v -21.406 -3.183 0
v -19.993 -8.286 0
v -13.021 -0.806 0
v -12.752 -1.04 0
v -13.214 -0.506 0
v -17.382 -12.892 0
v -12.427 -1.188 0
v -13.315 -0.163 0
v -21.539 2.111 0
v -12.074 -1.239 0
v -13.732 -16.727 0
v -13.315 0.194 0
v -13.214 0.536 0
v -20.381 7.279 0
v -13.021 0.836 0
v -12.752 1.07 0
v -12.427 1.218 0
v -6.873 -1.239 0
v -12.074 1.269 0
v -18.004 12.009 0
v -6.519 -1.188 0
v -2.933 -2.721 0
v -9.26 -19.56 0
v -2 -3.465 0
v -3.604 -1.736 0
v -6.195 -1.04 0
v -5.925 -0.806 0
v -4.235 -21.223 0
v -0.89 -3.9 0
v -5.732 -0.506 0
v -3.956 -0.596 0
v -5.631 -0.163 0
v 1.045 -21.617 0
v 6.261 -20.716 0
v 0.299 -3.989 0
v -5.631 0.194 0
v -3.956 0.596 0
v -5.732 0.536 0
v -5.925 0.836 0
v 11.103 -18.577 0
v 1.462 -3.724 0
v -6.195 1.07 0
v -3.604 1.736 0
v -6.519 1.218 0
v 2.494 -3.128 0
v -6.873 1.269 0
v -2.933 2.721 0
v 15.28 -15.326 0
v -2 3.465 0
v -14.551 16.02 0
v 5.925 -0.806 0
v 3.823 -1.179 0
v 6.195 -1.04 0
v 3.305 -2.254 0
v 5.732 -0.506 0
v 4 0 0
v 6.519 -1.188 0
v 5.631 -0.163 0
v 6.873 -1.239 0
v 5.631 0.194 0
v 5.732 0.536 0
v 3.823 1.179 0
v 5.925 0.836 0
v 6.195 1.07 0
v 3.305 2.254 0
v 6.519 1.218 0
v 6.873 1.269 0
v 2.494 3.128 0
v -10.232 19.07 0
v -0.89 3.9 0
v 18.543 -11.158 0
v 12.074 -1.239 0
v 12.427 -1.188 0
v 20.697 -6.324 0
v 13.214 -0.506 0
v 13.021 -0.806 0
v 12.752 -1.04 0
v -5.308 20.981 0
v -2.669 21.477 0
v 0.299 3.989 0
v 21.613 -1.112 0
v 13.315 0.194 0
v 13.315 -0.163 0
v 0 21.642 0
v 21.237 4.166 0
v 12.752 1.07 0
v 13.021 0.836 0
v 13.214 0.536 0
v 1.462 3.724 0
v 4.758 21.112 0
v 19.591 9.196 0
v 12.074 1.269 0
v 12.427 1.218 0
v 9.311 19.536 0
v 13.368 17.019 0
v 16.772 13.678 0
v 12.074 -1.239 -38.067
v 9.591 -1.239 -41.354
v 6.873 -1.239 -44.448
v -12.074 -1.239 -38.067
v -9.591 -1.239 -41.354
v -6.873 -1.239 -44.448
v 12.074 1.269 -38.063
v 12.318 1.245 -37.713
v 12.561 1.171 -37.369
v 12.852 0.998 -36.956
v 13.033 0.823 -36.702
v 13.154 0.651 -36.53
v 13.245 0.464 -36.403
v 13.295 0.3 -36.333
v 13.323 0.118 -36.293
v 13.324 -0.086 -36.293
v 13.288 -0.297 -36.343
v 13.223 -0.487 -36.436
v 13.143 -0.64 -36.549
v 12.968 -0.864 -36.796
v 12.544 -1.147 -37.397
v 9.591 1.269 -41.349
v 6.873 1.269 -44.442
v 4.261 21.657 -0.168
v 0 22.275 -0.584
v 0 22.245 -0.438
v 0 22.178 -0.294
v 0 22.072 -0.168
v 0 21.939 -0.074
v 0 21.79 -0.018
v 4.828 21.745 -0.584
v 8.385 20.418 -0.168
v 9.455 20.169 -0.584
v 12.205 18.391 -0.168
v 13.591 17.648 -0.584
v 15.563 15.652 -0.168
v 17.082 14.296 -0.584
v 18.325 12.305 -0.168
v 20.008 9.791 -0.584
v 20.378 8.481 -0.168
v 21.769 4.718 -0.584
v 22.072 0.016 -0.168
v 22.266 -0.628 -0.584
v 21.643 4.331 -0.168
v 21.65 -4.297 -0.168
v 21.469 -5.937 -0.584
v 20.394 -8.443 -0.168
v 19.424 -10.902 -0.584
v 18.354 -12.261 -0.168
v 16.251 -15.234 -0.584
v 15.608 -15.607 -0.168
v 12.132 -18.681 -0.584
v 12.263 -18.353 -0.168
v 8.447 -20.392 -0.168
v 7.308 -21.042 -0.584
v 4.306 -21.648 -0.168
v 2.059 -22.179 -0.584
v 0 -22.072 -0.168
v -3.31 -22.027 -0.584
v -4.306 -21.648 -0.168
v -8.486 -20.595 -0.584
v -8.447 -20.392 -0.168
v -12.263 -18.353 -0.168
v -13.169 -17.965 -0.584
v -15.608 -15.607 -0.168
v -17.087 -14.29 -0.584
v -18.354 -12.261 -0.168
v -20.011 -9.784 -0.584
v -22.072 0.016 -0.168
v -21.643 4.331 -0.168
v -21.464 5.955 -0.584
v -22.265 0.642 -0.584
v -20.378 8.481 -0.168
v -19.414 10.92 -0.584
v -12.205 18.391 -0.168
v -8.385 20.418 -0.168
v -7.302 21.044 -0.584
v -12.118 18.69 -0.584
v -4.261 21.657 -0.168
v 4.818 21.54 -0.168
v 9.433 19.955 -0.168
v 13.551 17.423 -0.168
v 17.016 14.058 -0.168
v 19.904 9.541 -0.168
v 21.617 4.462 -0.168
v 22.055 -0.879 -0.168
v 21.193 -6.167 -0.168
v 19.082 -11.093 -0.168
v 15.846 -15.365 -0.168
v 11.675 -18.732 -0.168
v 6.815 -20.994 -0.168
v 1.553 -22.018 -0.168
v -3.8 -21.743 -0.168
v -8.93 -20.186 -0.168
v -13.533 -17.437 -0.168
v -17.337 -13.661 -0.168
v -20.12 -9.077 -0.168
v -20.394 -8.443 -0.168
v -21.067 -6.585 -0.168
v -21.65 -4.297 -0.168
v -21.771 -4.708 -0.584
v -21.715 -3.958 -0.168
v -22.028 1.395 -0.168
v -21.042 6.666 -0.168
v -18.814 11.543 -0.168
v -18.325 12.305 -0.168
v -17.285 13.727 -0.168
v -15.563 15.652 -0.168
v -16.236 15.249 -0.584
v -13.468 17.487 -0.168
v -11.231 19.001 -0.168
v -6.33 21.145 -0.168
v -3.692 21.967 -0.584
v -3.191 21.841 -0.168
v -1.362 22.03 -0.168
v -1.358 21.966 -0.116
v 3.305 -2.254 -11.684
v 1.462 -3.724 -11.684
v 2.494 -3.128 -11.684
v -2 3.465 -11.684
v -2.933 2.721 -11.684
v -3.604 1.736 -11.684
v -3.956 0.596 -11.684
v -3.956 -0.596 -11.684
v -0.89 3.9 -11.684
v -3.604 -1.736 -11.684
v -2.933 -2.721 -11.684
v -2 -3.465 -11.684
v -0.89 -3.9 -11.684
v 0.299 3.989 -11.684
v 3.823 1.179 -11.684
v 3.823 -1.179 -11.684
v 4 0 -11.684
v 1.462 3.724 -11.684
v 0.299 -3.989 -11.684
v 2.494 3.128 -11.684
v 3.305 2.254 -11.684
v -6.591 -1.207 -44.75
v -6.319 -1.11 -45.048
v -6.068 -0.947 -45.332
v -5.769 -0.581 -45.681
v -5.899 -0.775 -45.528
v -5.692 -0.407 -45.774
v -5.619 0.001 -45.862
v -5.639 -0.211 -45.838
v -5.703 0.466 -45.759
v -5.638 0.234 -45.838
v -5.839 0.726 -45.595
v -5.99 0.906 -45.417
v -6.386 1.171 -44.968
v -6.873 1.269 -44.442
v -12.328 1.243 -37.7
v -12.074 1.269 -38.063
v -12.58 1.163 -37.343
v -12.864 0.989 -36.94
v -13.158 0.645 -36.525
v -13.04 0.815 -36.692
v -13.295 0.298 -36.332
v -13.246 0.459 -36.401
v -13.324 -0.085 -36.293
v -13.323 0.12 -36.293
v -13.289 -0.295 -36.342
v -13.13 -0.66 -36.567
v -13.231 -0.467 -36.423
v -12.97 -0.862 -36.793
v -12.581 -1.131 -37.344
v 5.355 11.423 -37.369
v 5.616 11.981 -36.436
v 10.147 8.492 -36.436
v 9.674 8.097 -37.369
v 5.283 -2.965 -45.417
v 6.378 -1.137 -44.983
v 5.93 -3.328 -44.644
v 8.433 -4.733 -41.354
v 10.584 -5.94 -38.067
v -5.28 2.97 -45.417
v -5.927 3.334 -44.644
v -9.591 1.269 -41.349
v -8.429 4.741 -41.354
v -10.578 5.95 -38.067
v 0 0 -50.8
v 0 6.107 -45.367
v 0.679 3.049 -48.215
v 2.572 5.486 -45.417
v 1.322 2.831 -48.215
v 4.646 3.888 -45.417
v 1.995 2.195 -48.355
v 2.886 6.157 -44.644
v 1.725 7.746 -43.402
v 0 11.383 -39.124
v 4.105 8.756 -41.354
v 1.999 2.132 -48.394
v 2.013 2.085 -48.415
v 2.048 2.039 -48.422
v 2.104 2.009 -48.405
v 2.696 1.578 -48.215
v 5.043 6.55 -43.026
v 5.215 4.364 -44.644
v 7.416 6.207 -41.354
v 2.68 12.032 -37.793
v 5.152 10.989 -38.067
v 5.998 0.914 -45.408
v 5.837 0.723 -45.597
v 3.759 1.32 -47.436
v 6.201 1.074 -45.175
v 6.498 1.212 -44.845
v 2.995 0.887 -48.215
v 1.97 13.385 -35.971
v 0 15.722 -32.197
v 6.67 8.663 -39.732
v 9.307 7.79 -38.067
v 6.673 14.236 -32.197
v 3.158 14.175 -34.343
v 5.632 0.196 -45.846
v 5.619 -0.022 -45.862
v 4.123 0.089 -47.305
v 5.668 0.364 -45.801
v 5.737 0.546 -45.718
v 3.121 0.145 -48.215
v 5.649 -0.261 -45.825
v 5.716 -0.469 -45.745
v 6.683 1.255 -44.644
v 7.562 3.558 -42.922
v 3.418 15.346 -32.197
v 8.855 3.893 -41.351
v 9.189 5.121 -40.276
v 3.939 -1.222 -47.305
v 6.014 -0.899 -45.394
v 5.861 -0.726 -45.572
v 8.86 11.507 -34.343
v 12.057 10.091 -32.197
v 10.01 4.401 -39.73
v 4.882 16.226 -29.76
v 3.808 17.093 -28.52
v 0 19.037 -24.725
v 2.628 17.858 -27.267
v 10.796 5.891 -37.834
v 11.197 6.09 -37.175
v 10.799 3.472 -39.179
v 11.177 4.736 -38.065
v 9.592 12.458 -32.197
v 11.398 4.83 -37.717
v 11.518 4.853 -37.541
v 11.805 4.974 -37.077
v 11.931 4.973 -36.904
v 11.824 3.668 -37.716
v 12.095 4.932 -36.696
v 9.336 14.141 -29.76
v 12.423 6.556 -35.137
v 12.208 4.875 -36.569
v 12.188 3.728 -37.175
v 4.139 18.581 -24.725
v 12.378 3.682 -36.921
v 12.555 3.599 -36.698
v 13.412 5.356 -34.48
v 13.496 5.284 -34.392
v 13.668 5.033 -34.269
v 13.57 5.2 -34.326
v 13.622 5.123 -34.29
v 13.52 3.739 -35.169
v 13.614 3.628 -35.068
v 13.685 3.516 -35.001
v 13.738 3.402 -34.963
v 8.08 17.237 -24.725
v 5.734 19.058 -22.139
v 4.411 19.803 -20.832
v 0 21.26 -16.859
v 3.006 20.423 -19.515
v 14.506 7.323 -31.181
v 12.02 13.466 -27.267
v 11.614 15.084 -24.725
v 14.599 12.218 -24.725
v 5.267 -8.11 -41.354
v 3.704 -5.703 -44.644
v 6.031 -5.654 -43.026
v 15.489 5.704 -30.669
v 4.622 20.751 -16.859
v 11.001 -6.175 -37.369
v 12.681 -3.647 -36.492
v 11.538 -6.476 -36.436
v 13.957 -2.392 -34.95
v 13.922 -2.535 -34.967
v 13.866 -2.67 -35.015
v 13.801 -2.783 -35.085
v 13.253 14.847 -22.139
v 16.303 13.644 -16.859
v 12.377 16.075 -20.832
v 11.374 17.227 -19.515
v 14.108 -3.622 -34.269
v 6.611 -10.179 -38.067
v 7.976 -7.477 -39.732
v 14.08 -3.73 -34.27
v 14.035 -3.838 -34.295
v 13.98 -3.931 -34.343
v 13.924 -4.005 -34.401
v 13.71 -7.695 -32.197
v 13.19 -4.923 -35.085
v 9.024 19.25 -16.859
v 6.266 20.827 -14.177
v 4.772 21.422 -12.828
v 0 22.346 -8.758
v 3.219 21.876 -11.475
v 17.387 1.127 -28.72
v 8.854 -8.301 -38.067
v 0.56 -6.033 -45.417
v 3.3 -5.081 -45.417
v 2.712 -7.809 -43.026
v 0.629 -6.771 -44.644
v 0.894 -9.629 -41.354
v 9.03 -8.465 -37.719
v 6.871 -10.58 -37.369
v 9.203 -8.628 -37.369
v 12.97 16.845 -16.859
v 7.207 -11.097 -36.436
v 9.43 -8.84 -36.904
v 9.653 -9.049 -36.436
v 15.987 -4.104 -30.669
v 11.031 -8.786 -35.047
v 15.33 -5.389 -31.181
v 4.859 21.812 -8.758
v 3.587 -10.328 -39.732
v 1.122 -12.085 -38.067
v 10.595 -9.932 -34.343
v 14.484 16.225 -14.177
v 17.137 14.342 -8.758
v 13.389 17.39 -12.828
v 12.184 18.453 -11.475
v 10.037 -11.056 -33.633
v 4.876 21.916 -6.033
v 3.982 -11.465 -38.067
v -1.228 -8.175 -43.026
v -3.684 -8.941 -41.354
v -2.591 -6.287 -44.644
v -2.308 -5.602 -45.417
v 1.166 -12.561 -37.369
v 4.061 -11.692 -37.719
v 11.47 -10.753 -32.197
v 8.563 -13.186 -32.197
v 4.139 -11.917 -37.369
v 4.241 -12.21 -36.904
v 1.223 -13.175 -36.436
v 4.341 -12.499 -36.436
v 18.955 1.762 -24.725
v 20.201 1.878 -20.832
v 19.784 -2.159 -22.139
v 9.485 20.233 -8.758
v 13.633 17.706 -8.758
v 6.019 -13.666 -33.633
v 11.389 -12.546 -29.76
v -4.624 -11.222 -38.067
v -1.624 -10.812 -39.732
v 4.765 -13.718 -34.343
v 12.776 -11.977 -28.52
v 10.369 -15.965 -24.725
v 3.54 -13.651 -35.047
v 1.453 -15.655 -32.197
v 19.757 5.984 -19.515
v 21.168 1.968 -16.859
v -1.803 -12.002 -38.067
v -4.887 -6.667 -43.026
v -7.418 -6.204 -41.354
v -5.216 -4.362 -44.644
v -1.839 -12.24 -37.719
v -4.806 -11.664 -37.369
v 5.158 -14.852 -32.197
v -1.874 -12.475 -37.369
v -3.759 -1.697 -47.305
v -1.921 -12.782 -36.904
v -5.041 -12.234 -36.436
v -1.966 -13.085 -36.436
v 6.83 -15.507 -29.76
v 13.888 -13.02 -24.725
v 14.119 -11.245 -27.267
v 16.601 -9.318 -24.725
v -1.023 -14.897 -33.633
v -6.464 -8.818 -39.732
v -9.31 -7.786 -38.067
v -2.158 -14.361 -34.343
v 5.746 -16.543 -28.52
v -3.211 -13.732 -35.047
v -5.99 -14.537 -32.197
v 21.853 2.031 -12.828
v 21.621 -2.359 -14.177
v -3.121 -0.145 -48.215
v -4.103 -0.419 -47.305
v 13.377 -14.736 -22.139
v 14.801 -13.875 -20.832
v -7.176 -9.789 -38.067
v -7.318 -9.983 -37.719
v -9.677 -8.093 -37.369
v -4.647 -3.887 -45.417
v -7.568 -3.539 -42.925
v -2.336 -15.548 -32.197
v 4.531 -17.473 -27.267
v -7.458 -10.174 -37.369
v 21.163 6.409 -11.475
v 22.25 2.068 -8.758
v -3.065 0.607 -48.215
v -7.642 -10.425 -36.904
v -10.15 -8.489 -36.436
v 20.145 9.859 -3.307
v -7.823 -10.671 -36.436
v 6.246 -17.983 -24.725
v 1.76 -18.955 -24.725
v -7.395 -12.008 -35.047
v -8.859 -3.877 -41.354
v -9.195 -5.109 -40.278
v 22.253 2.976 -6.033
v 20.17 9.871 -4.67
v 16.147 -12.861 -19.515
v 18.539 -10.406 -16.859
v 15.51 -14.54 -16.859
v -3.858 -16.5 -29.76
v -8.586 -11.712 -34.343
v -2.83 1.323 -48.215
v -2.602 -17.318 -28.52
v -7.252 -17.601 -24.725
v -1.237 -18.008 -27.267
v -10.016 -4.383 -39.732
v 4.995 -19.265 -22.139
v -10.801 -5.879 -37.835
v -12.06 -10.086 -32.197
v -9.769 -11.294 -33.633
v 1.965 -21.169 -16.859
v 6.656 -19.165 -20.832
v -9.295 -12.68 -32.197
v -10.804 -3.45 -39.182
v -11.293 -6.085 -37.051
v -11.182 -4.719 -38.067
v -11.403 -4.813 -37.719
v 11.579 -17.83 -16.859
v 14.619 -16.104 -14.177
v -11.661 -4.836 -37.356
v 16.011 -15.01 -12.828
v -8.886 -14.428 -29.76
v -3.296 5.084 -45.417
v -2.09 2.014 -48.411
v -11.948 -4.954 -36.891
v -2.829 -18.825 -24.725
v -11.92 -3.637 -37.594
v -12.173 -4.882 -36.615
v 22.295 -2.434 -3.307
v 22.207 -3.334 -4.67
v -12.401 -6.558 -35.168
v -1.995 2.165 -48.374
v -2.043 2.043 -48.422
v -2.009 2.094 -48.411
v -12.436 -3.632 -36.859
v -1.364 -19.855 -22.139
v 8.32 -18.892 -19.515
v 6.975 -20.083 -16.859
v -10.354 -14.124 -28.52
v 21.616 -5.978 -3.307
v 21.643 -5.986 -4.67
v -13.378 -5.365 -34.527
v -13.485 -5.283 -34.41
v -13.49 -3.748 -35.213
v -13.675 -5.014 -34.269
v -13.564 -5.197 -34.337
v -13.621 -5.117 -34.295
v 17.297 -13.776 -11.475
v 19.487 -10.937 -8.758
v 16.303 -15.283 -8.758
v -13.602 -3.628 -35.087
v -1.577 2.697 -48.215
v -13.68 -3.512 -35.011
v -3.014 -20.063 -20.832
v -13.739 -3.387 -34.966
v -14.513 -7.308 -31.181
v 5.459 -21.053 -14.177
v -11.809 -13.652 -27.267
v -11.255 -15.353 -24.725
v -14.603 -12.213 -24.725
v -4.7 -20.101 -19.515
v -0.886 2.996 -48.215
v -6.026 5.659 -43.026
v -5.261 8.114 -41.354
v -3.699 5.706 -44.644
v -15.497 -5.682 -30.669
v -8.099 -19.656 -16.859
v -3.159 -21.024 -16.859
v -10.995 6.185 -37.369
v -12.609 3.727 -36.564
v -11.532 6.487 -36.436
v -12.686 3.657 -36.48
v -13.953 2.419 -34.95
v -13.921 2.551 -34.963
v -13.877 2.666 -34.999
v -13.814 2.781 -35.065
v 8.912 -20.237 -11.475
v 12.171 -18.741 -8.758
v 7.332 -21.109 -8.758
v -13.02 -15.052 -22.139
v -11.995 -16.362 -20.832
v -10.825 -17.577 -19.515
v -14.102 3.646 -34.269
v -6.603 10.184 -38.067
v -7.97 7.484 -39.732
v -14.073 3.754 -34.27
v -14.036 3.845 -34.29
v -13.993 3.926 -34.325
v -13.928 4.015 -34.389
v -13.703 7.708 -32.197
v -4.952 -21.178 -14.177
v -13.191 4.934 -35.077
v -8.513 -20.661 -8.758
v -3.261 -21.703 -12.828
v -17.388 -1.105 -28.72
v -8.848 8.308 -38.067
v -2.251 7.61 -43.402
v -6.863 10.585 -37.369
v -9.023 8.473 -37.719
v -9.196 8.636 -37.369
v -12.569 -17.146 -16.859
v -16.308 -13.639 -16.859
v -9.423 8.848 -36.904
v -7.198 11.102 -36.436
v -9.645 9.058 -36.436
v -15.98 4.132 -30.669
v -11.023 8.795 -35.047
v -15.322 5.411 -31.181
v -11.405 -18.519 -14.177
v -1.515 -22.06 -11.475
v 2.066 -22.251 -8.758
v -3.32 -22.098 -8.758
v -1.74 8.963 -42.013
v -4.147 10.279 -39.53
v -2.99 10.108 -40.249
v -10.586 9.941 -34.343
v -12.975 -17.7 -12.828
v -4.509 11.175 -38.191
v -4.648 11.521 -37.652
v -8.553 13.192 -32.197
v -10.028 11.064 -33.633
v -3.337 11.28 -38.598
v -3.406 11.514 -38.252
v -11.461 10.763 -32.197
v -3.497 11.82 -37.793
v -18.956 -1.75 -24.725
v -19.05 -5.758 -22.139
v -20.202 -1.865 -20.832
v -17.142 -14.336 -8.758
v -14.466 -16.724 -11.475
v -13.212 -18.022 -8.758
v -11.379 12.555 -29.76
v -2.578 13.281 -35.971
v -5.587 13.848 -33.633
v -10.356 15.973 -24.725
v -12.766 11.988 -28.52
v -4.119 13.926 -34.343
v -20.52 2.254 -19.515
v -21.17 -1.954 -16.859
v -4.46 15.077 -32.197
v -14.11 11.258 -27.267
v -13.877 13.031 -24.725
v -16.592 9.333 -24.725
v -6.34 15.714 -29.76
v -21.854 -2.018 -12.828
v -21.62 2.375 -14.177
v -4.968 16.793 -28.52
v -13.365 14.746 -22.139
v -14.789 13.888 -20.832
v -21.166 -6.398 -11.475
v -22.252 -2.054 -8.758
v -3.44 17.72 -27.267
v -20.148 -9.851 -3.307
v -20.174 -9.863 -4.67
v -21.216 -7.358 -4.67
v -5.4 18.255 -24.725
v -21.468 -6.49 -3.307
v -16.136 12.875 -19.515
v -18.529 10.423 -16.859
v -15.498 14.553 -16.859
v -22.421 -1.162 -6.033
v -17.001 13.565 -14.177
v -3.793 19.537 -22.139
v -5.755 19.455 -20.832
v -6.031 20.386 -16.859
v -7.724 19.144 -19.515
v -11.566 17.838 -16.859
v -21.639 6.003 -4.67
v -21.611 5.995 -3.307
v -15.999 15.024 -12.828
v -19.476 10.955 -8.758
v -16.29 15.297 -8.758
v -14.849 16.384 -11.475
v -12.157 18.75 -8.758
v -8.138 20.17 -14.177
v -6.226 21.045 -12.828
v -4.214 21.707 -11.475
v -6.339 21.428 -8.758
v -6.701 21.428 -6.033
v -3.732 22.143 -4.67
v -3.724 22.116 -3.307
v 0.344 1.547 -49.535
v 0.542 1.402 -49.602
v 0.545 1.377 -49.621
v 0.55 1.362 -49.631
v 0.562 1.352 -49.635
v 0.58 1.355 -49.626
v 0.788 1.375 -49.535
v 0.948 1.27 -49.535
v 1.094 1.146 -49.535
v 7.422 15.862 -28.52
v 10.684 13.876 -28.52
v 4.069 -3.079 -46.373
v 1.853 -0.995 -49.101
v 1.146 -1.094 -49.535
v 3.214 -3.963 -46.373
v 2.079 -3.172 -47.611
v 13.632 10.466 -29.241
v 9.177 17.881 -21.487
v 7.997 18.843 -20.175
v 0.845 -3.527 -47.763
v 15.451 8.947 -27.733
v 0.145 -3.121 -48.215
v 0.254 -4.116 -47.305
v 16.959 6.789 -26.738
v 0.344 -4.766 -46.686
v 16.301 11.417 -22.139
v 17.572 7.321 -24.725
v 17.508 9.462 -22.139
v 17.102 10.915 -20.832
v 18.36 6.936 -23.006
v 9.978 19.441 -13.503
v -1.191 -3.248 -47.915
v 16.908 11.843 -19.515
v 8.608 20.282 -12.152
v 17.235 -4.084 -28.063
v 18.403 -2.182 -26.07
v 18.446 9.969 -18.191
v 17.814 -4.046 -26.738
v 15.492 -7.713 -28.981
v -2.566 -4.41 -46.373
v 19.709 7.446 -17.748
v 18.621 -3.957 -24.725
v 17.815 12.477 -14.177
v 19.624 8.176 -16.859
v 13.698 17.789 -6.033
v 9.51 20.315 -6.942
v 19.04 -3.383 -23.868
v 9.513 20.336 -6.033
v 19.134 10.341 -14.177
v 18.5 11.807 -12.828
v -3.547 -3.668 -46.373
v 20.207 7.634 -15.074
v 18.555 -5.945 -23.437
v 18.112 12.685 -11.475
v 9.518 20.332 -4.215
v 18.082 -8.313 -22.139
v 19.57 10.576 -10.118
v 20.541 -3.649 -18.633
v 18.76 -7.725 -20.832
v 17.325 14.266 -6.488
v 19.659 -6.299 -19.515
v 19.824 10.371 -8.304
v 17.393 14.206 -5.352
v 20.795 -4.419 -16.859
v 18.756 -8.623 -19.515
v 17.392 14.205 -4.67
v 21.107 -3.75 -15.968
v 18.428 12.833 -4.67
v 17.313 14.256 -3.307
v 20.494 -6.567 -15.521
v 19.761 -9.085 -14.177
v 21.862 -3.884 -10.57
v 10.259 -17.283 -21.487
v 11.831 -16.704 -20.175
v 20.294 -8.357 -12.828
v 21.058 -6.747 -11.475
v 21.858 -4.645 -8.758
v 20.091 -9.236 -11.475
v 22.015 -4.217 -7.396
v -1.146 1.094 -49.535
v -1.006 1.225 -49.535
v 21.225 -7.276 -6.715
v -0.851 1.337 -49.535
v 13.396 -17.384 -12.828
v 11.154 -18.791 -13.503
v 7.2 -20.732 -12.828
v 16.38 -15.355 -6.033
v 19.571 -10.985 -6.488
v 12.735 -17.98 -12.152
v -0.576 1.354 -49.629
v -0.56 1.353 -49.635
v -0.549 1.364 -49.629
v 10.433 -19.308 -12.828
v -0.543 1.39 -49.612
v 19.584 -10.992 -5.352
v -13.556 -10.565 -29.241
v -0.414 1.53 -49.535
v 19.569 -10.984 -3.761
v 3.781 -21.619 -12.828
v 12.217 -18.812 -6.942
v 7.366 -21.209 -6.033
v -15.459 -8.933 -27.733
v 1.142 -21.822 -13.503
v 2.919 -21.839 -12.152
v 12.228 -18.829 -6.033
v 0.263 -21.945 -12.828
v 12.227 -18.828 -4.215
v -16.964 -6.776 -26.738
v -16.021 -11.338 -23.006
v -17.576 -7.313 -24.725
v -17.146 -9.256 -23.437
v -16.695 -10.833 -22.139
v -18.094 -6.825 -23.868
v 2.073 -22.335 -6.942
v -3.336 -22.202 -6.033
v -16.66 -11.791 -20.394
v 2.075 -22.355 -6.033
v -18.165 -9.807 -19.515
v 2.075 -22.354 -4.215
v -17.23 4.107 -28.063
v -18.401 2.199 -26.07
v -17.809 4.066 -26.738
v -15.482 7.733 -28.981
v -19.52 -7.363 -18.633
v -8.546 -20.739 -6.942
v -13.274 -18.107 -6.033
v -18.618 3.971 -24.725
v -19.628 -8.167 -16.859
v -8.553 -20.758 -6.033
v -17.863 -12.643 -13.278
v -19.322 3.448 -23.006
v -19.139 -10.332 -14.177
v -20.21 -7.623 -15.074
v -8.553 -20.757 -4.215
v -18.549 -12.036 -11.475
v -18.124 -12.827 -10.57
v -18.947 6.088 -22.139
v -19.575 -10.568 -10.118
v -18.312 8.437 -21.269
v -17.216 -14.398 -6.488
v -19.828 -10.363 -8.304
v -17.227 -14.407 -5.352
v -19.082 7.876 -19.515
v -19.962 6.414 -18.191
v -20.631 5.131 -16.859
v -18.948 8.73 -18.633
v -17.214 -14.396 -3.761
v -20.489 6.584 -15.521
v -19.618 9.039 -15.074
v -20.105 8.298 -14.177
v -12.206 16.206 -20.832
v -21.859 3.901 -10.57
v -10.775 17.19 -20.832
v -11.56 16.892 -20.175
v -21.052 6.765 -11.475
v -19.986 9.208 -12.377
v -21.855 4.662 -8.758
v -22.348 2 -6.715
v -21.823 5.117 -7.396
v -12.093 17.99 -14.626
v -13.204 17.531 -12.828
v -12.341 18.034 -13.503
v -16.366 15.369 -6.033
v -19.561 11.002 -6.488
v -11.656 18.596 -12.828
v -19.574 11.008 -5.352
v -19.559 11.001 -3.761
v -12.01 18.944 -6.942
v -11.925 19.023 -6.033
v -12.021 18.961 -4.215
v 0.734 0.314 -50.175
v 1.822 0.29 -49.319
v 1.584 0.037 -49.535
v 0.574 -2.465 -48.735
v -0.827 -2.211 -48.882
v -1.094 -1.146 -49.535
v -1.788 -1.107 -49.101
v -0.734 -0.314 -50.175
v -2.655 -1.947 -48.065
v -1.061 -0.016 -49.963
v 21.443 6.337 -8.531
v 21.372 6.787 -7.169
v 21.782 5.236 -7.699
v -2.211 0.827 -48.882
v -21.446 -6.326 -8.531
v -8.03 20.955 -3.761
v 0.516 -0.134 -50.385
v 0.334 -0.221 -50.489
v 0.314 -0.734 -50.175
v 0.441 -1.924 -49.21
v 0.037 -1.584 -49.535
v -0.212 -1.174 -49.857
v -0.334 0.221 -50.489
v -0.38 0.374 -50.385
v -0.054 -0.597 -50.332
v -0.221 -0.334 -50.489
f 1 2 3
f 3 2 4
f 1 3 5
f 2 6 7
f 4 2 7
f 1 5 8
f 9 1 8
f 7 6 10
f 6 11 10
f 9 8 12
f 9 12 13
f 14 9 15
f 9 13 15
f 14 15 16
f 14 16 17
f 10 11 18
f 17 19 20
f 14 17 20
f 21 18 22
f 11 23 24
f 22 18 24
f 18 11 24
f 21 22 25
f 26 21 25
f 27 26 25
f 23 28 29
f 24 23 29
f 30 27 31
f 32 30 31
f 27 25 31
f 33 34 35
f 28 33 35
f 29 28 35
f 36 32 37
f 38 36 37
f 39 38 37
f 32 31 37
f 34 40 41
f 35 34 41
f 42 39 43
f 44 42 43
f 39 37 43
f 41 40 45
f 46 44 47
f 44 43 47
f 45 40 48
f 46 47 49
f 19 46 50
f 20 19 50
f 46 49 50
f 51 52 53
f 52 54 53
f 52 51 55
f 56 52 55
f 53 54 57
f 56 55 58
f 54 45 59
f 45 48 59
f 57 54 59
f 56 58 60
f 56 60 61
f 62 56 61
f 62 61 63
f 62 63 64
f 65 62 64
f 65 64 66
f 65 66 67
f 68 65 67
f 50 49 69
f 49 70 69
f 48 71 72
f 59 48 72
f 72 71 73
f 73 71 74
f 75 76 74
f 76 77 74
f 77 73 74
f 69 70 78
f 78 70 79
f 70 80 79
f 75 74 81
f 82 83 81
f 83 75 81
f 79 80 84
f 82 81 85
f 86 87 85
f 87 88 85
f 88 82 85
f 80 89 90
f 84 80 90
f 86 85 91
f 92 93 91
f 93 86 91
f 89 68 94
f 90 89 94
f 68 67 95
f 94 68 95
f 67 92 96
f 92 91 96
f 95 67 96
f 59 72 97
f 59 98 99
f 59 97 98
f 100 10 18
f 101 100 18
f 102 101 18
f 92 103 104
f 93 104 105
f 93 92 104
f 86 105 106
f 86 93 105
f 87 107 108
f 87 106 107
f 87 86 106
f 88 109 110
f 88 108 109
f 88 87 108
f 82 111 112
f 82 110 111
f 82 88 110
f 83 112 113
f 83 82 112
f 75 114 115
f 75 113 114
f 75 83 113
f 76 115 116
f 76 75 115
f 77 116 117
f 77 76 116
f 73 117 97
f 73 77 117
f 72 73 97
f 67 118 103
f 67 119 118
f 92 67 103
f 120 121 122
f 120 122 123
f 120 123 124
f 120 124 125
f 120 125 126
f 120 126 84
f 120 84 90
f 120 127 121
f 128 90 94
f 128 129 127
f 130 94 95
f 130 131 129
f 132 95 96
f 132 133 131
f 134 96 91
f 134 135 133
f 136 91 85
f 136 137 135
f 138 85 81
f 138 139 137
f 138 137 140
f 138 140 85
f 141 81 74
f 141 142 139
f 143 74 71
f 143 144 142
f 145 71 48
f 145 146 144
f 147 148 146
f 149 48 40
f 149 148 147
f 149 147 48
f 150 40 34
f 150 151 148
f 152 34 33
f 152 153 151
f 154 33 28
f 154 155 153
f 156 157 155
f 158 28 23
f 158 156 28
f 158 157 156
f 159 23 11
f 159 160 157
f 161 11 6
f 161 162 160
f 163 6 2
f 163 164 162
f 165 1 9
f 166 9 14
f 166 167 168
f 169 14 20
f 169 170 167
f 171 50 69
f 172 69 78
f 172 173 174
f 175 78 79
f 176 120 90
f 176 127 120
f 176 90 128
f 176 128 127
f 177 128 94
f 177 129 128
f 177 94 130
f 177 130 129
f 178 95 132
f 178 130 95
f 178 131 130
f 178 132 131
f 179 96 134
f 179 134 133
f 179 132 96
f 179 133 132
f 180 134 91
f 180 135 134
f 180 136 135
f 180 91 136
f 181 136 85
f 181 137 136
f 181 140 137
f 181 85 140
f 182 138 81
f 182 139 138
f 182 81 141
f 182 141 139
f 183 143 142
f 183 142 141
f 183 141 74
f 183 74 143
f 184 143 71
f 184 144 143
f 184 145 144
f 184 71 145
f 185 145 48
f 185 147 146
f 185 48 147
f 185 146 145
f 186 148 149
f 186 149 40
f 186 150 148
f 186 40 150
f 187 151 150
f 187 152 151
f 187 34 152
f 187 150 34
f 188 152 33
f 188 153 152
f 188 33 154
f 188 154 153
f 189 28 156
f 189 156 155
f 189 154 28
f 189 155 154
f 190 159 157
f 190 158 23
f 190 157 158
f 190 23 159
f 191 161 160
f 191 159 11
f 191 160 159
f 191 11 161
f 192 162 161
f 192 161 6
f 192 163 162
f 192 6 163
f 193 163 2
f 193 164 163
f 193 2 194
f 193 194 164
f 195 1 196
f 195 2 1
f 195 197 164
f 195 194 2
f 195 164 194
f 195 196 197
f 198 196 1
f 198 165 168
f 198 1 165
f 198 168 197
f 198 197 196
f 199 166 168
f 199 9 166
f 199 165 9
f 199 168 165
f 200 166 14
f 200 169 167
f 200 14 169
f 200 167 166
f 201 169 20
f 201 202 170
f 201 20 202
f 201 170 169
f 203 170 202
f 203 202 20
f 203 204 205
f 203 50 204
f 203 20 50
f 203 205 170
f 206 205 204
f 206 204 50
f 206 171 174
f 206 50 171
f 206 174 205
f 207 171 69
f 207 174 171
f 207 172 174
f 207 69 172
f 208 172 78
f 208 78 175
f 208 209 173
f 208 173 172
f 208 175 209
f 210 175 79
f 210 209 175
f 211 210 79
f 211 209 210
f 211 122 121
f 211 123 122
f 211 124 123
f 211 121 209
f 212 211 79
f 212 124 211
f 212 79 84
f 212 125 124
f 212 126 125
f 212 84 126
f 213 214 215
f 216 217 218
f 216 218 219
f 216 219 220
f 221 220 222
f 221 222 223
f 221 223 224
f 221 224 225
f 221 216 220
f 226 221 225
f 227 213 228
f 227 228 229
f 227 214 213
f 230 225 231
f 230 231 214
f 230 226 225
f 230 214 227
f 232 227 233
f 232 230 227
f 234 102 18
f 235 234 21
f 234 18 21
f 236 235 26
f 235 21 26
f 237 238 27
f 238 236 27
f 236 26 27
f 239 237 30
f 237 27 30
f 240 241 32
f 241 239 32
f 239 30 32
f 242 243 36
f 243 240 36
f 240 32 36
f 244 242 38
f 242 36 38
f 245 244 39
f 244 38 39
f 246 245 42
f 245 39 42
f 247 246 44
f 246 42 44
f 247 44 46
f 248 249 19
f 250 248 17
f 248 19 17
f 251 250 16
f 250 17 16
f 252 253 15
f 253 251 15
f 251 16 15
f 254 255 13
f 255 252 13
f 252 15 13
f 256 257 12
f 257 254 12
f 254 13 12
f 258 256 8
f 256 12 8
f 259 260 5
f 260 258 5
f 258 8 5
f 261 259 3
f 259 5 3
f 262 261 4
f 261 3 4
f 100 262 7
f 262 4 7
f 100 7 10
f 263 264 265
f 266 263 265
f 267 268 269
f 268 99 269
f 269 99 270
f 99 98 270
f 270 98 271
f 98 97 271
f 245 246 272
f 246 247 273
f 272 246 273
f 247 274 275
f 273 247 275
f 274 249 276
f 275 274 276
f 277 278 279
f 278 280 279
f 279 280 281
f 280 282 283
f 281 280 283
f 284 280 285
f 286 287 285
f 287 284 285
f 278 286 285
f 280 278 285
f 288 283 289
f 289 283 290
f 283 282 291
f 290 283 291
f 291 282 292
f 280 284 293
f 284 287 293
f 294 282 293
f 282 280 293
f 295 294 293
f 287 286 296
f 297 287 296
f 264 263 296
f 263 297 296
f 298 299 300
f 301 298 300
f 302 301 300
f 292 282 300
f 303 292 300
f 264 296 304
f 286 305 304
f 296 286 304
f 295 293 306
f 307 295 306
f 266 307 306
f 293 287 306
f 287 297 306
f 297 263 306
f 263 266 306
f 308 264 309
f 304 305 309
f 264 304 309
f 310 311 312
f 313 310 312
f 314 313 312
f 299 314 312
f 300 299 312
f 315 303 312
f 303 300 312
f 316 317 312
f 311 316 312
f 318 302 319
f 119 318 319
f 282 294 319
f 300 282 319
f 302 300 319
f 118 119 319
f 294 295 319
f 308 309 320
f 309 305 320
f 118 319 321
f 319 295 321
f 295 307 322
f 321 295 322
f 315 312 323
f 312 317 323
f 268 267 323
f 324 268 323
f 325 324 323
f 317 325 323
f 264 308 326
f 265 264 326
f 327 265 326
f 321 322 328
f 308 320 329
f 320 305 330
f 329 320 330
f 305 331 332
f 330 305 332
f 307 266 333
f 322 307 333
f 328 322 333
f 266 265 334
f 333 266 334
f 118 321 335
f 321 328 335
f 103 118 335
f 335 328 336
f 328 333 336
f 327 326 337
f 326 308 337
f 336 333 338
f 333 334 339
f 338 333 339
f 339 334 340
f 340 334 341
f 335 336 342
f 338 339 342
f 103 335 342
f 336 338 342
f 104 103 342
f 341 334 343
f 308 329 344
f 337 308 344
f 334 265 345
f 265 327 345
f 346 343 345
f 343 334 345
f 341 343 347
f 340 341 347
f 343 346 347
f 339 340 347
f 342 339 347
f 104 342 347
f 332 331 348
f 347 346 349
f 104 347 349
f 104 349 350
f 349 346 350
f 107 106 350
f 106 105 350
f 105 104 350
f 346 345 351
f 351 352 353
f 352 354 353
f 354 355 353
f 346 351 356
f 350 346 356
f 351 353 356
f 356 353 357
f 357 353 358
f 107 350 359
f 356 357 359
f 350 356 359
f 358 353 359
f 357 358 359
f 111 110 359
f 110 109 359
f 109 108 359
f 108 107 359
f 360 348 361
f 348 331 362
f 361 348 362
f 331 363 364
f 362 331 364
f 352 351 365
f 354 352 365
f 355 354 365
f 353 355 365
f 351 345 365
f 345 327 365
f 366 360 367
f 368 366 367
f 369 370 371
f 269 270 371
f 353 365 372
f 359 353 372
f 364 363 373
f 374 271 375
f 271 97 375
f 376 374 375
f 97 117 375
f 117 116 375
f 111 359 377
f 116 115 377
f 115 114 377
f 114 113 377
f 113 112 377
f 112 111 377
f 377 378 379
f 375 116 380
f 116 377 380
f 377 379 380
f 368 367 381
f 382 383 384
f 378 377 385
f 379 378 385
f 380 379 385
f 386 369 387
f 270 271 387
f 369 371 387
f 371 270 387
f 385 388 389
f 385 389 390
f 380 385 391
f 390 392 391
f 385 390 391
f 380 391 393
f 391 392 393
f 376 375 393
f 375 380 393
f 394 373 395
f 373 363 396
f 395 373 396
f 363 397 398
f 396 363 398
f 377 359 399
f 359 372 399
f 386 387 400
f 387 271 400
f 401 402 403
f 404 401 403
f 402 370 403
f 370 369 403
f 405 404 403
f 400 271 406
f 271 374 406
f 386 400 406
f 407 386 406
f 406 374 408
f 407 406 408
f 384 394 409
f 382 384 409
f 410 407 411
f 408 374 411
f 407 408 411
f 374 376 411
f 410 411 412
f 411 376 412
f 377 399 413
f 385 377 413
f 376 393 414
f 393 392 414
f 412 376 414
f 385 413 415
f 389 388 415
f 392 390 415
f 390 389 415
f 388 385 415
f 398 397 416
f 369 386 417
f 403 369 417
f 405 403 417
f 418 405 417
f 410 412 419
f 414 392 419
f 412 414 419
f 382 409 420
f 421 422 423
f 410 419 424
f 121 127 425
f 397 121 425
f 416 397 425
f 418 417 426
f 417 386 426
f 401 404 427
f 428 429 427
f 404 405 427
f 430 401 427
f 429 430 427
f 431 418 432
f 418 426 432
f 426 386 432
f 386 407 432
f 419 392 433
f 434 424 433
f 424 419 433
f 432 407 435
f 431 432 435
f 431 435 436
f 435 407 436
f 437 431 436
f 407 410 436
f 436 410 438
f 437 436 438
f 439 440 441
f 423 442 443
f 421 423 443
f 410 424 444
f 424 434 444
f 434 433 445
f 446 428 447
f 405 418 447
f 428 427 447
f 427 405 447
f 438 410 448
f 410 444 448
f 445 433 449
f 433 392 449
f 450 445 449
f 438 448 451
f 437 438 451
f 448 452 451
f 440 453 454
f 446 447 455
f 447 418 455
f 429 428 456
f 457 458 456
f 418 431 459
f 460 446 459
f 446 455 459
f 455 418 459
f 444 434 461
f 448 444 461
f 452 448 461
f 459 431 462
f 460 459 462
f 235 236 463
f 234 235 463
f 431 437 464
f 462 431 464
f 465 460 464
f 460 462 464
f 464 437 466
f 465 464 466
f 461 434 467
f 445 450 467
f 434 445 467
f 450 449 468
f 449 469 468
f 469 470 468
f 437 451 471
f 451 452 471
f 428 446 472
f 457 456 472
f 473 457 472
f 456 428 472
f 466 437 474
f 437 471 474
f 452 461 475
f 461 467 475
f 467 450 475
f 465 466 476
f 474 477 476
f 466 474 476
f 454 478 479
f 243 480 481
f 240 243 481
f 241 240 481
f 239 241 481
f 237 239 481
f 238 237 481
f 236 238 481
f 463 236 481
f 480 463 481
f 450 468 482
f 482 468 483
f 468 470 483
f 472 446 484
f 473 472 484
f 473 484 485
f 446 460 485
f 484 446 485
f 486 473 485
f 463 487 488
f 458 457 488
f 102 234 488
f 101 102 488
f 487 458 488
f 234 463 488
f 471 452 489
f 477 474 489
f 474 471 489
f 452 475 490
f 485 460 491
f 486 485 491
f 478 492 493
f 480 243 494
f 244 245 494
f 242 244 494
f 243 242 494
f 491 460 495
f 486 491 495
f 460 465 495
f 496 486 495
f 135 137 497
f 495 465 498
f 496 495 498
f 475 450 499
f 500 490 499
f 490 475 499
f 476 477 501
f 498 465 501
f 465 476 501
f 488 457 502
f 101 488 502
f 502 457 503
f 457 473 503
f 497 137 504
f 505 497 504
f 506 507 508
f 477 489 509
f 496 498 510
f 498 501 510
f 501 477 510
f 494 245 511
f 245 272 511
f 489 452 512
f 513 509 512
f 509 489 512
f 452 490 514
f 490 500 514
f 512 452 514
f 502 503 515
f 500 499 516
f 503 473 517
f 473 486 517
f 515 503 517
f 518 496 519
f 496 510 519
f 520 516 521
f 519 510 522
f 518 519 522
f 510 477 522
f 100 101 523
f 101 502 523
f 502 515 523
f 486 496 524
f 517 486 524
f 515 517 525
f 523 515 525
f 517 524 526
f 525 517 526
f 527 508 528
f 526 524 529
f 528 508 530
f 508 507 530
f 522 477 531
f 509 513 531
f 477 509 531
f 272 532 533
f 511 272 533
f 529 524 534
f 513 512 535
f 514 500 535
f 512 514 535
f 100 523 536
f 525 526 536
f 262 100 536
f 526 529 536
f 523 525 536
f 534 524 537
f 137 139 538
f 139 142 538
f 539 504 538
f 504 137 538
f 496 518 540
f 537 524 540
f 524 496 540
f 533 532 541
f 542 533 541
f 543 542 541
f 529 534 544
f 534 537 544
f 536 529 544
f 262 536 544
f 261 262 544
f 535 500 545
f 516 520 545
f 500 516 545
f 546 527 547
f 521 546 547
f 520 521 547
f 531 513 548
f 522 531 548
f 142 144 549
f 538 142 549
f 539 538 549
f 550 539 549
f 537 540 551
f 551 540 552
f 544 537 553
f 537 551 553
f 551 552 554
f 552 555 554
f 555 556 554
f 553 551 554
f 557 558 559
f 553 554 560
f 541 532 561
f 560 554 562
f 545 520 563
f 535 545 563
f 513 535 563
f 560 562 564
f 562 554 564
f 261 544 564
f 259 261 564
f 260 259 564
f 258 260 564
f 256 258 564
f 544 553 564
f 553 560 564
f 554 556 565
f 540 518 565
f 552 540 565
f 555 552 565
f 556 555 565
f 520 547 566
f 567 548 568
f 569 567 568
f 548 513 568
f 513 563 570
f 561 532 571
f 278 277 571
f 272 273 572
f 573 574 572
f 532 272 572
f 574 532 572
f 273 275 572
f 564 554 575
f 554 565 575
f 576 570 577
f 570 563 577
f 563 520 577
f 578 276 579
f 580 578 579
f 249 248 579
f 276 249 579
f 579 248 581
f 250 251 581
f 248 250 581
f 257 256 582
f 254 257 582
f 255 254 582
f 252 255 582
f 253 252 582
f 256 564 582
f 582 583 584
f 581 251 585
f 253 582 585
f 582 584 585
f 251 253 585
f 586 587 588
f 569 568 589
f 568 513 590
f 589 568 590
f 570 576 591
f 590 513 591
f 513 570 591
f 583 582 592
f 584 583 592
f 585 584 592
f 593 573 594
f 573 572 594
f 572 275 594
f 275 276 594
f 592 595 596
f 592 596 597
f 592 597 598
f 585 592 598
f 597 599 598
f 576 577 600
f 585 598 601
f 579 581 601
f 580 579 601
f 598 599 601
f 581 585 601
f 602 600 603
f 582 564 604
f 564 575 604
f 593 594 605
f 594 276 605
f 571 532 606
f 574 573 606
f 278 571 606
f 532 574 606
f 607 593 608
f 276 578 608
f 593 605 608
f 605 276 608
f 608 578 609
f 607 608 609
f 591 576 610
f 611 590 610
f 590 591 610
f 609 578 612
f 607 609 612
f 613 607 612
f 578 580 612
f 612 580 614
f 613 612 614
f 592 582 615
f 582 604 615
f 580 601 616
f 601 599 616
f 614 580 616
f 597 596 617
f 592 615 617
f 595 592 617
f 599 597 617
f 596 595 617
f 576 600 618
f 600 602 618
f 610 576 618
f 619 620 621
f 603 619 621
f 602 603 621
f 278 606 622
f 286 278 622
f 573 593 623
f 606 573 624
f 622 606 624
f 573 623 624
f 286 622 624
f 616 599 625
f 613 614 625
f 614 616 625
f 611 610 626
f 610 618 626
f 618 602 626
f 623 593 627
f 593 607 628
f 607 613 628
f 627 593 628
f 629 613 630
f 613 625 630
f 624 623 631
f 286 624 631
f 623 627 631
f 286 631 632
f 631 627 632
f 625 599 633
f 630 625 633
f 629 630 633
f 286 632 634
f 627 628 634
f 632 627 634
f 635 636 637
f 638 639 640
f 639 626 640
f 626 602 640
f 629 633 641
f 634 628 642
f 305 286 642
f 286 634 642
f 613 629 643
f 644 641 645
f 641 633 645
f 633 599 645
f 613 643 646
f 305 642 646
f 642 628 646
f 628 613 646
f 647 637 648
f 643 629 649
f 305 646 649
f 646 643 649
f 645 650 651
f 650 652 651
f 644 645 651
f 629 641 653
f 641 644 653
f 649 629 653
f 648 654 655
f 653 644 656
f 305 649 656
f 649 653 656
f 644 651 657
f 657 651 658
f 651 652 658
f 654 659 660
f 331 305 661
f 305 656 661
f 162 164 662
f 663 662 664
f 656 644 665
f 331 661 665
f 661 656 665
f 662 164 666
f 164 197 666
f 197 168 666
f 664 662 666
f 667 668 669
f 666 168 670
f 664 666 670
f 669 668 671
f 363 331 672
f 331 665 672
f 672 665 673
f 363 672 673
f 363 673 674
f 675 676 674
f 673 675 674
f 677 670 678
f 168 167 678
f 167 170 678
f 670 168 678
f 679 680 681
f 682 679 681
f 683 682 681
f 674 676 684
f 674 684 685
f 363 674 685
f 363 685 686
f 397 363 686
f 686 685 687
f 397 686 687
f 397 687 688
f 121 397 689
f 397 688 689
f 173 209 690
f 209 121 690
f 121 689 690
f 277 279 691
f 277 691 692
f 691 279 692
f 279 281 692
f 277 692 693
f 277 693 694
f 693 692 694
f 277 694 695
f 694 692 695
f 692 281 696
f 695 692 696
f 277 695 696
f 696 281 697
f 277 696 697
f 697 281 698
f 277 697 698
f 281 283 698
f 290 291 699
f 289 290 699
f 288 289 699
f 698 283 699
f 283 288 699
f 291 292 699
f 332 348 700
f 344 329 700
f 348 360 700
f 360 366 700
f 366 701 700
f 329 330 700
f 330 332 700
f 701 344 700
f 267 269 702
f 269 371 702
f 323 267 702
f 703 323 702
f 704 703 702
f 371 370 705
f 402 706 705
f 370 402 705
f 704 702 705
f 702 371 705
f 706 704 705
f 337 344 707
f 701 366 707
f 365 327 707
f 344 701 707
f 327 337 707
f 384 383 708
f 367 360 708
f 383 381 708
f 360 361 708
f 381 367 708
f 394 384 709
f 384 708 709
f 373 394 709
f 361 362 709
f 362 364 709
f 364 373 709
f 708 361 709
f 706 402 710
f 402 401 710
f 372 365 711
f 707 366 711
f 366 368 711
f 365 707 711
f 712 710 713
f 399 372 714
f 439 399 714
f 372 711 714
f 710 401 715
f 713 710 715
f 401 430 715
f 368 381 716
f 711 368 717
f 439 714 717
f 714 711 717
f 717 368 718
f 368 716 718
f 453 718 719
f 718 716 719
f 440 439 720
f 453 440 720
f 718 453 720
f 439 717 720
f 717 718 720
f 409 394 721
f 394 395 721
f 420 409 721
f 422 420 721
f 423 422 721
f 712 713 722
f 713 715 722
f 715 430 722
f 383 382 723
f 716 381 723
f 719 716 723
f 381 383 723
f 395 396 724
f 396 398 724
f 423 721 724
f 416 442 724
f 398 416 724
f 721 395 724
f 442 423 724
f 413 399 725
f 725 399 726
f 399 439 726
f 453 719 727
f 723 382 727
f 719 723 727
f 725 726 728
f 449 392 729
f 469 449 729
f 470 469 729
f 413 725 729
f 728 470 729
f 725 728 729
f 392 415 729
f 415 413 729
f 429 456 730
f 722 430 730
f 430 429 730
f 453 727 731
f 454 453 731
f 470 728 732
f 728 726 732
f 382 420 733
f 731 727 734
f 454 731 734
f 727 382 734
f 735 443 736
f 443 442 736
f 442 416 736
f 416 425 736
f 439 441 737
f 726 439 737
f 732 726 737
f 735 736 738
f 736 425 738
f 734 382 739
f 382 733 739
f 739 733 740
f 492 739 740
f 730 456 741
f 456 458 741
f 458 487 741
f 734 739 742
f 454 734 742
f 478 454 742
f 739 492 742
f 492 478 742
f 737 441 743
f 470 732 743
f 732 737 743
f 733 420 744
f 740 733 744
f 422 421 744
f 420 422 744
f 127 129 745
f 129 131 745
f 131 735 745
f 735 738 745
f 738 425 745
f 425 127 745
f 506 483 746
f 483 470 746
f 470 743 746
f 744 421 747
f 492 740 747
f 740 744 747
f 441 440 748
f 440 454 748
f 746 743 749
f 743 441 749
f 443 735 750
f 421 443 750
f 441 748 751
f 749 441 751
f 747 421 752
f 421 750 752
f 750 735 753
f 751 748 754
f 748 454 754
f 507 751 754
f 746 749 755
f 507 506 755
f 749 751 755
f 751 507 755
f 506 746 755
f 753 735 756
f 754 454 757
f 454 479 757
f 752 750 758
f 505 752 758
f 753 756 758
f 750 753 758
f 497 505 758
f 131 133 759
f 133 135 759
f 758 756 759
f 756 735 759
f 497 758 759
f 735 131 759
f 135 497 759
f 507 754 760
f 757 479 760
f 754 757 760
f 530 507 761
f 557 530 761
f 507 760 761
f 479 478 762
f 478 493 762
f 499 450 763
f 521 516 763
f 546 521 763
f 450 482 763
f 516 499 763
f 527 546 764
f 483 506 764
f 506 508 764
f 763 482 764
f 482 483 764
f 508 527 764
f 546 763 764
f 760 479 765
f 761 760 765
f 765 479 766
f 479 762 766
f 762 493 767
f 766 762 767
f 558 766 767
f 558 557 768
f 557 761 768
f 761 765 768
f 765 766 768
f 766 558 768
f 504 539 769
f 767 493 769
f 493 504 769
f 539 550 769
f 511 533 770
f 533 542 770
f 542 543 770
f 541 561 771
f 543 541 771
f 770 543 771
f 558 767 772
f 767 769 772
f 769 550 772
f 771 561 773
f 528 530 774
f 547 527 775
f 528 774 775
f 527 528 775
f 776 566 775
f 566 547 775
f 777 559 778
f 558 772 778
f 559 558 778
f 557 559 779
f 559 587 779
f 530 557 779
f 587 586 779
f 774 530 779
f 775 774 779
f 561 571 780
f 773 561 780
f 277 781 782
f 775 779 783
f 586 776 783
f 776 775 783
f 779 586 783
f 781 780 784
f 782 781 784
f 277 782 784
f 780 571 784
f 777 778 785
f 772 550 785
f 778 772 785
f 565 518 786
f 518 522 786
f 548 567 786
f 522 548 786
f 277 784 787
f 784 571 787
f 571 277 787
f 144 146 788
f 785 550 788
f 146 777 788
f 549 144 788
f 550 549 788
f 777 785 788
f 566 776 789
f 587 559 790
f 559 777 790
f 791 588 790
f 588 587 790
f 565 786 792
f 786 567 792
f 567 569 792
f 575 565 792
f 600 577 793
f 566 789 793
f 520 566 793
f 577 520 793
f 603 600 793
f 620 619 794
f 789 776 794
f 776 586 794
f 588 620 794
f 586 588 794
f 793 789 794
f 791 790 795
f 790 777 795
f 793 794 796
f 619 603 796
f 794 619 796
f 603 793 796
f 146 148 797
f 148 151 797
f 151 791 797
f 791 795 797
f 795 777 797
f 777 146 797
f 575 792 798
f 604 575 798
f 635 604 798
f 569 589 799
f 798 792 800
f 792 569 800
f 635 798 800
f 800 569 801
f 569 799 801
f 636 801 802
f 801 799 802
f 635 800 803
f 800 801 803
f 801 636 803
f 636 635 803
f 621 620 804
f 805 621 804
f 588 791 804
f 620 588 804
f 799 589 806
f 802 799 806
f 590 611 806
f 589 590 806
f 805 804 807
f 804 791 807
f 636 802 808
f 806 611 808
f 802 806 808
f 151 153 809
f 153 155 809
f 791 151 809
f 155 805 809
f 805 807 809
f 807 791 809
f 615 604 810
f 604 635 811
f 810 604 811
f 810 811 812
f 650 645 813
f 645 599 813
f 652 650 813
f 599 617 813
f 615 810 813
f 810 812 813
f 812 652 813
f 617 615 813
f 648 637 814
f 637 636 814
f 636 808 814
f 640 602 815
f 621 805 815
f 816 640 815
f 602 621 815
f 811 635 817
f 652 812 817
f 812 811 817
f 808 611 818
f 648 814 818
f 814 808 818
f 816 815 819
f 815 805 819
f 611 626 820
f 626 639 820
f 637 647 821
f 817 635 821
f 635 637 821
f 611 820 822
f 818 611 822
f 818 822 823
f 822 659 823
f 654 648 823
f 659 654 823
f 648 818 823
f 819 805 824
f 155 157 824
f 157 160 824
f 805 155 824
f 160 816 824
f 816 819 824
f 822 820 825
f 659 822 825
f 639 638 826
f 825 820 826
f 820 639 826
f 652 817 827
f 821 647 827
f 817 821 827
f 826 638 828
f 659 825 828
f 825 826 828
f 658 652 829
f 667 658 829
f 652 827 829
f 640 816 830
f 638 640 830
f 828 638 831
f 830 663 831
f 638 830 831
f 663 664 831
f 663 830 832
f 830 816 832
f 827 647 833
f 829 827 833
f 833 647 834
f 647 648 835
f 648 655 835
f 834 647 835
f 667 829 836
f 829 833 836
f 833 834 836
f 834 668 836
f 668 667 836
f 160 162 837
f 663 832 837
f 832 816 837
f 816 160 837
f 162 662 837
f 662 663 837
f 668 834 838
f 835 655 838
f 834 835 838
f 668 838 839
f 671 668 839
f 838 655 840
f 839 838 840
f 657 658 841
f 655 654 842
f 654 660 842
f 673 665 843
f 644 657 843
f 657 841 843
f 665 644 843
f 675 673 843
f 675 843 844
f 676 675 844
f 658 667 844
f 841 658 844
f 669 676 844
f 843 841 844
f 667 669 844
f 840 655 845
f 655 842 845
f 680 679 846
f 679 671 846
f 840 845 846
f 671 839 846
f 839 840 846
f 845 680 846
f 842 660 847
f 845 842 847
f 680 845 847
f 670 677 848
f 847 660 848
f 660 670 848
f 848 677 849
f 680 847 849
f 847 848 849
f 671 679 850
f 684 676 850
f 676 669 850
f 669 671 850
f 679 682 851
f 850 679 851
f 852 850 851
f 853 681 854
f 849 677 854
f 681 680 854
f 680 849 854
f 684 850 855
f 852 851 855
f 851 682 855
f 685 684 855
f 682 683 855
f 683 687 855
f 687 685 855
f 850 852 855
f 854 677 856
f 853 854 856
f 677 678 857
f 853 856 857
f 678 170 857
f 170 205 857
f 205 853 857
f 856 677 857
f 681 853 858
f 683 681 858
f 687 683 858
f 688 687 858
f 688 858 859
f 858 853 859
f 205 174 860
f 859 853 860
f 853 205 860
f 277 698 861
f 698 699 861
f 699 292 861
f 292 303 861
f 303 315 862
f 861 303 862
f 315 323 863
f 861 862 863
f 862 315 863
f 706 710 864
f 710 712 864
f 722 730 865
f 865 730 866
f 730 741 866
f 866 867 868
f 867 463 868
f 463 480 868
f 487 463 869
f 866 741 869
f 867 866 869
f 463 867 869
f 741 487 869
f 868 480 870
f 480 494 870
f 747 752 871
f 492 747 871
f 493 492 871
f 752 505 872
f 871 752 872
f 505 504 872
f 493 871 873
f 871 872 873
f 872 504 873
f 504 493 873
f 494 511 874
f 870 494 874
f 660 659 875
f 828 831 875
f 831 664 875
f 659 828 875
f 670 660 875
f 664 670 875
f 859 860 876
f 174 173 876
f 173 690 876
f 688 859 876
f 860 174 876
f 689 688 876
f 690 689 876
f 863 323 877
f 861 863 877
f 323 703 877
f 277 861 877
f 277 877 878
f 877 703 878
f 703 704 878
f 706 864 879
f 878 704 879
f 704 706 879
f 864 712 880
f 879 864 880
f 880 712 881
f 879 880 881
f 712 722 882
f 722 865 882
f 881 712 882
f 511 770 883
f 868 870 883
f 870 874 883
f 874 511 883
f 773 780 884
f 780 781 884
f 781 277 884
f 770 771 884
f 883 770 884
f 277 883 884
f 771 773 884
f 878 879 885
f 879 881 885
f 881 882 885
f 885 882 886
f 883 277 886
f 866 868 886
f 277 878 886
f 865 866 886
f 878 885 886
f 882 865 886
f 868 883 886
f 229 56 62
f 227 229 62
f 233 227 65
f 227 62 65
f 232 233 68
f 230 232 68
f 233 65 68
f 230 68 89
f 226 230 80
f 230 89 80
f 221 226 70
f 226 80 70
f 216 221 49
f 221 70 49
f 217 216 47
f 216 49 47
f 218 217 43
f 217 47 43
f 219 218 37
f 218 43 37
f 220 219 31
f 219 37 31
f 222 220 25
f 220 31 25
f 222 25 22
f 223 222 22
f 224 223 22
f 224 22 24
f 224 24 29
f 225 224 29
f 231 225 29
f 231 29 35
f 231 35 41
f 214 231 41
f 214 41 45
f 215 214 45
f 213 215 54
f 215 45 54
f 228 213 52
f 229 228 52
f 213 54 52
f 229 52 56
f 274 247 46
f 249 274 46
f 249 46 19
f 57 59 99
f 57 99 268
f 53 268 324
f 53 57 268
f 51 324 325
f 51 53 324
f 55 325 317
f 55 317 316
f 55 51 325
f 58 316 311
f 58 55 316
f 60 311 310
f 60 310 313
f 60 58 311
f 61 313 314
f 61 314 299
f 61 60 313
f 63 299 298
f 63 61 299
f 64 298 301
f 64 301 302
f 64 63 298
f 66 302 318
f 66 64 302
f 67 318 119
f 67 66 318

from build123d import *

# Parameters (mm, degrees)
FILLET4_R          = 0.635
SKETCH10_R         = 4.0005
CUT_EXTRUDE5_DEPTH = 11.684
CUT_EXTRUDE6_DEPTH = 82.55


with BuildPart() as part:
    # Sketch9 → Revolve2 (revolve)
    with BuildSketch(Plane(origin=(0, 0, 0), x_dir=(0, 0, -1), z_dir=(1, 0, 0))):
        with BuildLine():
            Line((0, 0), (50.8, 0))
            ThreePointArc((50.8, 0), (28.251626652, 17.630503777), (0, 22.225))
            Line((0, 22.225), (0, 0))
        make_face()
    revolve(axis=Axis((0, 0, 0), (0, 0, -1)))

    # Fillet4
    fillet4_edges = [part.edges().sort_by_distance(p)[0] for p in [
        (0, -22.225, 0),
    ]]
    fillet(fillet4_edges, radius=FILLET4_R)

    # Sketch10 → Cut-Extrude5 (cut)
    with BuildSketch(Plane.XY):
        Circle(SKETCH10_R)
    extrude(amount=-CUT_EXTRUDE5_DEPTH, mode=Mode.SUBTRACT)

    # Sketch11 → Cut-Extrude6 (cut)
    with BuildSketch(Plane.XY):
        with BuildLine():
            Line((6.872643409, 1.269271981), (12.073562746, 1.269271981))
            ThreePointArc((12.073562746, 1.269271981), (13.327653654, 0.015181073), (12.073562746, -1.238909835))
            Line((12.073562746, -1.238909835), (6.872643409, -1.238909835))
            ThreePointArc((6.872643409, -1.238909835), (5.618552501, 0.015181073), (6.872643409, 1.269271981))
        make_face()
        with BuildLine():
            Line((-6.872643409, 1.269271981), (-12.073562746, 1.269271981))
            ThreePointArc((-12.073562746, 1.269271981), (-13.327653654, 0.015181073), (-12.073562746, -1.238909835))
            Line((-12.073562746, -1.238909835), (-6.872643409, -1.238909835))
            ThreePointArc((-6.872643409, -1.238909835), (-5.618552501, 0.015181073), (-6.872643409, 1.269271981))
        make_face()
    extrude(amount=-CUT_EXTRUDE6_DEPTH, mode=Mode.SUBTRACT)


solid = part.part
